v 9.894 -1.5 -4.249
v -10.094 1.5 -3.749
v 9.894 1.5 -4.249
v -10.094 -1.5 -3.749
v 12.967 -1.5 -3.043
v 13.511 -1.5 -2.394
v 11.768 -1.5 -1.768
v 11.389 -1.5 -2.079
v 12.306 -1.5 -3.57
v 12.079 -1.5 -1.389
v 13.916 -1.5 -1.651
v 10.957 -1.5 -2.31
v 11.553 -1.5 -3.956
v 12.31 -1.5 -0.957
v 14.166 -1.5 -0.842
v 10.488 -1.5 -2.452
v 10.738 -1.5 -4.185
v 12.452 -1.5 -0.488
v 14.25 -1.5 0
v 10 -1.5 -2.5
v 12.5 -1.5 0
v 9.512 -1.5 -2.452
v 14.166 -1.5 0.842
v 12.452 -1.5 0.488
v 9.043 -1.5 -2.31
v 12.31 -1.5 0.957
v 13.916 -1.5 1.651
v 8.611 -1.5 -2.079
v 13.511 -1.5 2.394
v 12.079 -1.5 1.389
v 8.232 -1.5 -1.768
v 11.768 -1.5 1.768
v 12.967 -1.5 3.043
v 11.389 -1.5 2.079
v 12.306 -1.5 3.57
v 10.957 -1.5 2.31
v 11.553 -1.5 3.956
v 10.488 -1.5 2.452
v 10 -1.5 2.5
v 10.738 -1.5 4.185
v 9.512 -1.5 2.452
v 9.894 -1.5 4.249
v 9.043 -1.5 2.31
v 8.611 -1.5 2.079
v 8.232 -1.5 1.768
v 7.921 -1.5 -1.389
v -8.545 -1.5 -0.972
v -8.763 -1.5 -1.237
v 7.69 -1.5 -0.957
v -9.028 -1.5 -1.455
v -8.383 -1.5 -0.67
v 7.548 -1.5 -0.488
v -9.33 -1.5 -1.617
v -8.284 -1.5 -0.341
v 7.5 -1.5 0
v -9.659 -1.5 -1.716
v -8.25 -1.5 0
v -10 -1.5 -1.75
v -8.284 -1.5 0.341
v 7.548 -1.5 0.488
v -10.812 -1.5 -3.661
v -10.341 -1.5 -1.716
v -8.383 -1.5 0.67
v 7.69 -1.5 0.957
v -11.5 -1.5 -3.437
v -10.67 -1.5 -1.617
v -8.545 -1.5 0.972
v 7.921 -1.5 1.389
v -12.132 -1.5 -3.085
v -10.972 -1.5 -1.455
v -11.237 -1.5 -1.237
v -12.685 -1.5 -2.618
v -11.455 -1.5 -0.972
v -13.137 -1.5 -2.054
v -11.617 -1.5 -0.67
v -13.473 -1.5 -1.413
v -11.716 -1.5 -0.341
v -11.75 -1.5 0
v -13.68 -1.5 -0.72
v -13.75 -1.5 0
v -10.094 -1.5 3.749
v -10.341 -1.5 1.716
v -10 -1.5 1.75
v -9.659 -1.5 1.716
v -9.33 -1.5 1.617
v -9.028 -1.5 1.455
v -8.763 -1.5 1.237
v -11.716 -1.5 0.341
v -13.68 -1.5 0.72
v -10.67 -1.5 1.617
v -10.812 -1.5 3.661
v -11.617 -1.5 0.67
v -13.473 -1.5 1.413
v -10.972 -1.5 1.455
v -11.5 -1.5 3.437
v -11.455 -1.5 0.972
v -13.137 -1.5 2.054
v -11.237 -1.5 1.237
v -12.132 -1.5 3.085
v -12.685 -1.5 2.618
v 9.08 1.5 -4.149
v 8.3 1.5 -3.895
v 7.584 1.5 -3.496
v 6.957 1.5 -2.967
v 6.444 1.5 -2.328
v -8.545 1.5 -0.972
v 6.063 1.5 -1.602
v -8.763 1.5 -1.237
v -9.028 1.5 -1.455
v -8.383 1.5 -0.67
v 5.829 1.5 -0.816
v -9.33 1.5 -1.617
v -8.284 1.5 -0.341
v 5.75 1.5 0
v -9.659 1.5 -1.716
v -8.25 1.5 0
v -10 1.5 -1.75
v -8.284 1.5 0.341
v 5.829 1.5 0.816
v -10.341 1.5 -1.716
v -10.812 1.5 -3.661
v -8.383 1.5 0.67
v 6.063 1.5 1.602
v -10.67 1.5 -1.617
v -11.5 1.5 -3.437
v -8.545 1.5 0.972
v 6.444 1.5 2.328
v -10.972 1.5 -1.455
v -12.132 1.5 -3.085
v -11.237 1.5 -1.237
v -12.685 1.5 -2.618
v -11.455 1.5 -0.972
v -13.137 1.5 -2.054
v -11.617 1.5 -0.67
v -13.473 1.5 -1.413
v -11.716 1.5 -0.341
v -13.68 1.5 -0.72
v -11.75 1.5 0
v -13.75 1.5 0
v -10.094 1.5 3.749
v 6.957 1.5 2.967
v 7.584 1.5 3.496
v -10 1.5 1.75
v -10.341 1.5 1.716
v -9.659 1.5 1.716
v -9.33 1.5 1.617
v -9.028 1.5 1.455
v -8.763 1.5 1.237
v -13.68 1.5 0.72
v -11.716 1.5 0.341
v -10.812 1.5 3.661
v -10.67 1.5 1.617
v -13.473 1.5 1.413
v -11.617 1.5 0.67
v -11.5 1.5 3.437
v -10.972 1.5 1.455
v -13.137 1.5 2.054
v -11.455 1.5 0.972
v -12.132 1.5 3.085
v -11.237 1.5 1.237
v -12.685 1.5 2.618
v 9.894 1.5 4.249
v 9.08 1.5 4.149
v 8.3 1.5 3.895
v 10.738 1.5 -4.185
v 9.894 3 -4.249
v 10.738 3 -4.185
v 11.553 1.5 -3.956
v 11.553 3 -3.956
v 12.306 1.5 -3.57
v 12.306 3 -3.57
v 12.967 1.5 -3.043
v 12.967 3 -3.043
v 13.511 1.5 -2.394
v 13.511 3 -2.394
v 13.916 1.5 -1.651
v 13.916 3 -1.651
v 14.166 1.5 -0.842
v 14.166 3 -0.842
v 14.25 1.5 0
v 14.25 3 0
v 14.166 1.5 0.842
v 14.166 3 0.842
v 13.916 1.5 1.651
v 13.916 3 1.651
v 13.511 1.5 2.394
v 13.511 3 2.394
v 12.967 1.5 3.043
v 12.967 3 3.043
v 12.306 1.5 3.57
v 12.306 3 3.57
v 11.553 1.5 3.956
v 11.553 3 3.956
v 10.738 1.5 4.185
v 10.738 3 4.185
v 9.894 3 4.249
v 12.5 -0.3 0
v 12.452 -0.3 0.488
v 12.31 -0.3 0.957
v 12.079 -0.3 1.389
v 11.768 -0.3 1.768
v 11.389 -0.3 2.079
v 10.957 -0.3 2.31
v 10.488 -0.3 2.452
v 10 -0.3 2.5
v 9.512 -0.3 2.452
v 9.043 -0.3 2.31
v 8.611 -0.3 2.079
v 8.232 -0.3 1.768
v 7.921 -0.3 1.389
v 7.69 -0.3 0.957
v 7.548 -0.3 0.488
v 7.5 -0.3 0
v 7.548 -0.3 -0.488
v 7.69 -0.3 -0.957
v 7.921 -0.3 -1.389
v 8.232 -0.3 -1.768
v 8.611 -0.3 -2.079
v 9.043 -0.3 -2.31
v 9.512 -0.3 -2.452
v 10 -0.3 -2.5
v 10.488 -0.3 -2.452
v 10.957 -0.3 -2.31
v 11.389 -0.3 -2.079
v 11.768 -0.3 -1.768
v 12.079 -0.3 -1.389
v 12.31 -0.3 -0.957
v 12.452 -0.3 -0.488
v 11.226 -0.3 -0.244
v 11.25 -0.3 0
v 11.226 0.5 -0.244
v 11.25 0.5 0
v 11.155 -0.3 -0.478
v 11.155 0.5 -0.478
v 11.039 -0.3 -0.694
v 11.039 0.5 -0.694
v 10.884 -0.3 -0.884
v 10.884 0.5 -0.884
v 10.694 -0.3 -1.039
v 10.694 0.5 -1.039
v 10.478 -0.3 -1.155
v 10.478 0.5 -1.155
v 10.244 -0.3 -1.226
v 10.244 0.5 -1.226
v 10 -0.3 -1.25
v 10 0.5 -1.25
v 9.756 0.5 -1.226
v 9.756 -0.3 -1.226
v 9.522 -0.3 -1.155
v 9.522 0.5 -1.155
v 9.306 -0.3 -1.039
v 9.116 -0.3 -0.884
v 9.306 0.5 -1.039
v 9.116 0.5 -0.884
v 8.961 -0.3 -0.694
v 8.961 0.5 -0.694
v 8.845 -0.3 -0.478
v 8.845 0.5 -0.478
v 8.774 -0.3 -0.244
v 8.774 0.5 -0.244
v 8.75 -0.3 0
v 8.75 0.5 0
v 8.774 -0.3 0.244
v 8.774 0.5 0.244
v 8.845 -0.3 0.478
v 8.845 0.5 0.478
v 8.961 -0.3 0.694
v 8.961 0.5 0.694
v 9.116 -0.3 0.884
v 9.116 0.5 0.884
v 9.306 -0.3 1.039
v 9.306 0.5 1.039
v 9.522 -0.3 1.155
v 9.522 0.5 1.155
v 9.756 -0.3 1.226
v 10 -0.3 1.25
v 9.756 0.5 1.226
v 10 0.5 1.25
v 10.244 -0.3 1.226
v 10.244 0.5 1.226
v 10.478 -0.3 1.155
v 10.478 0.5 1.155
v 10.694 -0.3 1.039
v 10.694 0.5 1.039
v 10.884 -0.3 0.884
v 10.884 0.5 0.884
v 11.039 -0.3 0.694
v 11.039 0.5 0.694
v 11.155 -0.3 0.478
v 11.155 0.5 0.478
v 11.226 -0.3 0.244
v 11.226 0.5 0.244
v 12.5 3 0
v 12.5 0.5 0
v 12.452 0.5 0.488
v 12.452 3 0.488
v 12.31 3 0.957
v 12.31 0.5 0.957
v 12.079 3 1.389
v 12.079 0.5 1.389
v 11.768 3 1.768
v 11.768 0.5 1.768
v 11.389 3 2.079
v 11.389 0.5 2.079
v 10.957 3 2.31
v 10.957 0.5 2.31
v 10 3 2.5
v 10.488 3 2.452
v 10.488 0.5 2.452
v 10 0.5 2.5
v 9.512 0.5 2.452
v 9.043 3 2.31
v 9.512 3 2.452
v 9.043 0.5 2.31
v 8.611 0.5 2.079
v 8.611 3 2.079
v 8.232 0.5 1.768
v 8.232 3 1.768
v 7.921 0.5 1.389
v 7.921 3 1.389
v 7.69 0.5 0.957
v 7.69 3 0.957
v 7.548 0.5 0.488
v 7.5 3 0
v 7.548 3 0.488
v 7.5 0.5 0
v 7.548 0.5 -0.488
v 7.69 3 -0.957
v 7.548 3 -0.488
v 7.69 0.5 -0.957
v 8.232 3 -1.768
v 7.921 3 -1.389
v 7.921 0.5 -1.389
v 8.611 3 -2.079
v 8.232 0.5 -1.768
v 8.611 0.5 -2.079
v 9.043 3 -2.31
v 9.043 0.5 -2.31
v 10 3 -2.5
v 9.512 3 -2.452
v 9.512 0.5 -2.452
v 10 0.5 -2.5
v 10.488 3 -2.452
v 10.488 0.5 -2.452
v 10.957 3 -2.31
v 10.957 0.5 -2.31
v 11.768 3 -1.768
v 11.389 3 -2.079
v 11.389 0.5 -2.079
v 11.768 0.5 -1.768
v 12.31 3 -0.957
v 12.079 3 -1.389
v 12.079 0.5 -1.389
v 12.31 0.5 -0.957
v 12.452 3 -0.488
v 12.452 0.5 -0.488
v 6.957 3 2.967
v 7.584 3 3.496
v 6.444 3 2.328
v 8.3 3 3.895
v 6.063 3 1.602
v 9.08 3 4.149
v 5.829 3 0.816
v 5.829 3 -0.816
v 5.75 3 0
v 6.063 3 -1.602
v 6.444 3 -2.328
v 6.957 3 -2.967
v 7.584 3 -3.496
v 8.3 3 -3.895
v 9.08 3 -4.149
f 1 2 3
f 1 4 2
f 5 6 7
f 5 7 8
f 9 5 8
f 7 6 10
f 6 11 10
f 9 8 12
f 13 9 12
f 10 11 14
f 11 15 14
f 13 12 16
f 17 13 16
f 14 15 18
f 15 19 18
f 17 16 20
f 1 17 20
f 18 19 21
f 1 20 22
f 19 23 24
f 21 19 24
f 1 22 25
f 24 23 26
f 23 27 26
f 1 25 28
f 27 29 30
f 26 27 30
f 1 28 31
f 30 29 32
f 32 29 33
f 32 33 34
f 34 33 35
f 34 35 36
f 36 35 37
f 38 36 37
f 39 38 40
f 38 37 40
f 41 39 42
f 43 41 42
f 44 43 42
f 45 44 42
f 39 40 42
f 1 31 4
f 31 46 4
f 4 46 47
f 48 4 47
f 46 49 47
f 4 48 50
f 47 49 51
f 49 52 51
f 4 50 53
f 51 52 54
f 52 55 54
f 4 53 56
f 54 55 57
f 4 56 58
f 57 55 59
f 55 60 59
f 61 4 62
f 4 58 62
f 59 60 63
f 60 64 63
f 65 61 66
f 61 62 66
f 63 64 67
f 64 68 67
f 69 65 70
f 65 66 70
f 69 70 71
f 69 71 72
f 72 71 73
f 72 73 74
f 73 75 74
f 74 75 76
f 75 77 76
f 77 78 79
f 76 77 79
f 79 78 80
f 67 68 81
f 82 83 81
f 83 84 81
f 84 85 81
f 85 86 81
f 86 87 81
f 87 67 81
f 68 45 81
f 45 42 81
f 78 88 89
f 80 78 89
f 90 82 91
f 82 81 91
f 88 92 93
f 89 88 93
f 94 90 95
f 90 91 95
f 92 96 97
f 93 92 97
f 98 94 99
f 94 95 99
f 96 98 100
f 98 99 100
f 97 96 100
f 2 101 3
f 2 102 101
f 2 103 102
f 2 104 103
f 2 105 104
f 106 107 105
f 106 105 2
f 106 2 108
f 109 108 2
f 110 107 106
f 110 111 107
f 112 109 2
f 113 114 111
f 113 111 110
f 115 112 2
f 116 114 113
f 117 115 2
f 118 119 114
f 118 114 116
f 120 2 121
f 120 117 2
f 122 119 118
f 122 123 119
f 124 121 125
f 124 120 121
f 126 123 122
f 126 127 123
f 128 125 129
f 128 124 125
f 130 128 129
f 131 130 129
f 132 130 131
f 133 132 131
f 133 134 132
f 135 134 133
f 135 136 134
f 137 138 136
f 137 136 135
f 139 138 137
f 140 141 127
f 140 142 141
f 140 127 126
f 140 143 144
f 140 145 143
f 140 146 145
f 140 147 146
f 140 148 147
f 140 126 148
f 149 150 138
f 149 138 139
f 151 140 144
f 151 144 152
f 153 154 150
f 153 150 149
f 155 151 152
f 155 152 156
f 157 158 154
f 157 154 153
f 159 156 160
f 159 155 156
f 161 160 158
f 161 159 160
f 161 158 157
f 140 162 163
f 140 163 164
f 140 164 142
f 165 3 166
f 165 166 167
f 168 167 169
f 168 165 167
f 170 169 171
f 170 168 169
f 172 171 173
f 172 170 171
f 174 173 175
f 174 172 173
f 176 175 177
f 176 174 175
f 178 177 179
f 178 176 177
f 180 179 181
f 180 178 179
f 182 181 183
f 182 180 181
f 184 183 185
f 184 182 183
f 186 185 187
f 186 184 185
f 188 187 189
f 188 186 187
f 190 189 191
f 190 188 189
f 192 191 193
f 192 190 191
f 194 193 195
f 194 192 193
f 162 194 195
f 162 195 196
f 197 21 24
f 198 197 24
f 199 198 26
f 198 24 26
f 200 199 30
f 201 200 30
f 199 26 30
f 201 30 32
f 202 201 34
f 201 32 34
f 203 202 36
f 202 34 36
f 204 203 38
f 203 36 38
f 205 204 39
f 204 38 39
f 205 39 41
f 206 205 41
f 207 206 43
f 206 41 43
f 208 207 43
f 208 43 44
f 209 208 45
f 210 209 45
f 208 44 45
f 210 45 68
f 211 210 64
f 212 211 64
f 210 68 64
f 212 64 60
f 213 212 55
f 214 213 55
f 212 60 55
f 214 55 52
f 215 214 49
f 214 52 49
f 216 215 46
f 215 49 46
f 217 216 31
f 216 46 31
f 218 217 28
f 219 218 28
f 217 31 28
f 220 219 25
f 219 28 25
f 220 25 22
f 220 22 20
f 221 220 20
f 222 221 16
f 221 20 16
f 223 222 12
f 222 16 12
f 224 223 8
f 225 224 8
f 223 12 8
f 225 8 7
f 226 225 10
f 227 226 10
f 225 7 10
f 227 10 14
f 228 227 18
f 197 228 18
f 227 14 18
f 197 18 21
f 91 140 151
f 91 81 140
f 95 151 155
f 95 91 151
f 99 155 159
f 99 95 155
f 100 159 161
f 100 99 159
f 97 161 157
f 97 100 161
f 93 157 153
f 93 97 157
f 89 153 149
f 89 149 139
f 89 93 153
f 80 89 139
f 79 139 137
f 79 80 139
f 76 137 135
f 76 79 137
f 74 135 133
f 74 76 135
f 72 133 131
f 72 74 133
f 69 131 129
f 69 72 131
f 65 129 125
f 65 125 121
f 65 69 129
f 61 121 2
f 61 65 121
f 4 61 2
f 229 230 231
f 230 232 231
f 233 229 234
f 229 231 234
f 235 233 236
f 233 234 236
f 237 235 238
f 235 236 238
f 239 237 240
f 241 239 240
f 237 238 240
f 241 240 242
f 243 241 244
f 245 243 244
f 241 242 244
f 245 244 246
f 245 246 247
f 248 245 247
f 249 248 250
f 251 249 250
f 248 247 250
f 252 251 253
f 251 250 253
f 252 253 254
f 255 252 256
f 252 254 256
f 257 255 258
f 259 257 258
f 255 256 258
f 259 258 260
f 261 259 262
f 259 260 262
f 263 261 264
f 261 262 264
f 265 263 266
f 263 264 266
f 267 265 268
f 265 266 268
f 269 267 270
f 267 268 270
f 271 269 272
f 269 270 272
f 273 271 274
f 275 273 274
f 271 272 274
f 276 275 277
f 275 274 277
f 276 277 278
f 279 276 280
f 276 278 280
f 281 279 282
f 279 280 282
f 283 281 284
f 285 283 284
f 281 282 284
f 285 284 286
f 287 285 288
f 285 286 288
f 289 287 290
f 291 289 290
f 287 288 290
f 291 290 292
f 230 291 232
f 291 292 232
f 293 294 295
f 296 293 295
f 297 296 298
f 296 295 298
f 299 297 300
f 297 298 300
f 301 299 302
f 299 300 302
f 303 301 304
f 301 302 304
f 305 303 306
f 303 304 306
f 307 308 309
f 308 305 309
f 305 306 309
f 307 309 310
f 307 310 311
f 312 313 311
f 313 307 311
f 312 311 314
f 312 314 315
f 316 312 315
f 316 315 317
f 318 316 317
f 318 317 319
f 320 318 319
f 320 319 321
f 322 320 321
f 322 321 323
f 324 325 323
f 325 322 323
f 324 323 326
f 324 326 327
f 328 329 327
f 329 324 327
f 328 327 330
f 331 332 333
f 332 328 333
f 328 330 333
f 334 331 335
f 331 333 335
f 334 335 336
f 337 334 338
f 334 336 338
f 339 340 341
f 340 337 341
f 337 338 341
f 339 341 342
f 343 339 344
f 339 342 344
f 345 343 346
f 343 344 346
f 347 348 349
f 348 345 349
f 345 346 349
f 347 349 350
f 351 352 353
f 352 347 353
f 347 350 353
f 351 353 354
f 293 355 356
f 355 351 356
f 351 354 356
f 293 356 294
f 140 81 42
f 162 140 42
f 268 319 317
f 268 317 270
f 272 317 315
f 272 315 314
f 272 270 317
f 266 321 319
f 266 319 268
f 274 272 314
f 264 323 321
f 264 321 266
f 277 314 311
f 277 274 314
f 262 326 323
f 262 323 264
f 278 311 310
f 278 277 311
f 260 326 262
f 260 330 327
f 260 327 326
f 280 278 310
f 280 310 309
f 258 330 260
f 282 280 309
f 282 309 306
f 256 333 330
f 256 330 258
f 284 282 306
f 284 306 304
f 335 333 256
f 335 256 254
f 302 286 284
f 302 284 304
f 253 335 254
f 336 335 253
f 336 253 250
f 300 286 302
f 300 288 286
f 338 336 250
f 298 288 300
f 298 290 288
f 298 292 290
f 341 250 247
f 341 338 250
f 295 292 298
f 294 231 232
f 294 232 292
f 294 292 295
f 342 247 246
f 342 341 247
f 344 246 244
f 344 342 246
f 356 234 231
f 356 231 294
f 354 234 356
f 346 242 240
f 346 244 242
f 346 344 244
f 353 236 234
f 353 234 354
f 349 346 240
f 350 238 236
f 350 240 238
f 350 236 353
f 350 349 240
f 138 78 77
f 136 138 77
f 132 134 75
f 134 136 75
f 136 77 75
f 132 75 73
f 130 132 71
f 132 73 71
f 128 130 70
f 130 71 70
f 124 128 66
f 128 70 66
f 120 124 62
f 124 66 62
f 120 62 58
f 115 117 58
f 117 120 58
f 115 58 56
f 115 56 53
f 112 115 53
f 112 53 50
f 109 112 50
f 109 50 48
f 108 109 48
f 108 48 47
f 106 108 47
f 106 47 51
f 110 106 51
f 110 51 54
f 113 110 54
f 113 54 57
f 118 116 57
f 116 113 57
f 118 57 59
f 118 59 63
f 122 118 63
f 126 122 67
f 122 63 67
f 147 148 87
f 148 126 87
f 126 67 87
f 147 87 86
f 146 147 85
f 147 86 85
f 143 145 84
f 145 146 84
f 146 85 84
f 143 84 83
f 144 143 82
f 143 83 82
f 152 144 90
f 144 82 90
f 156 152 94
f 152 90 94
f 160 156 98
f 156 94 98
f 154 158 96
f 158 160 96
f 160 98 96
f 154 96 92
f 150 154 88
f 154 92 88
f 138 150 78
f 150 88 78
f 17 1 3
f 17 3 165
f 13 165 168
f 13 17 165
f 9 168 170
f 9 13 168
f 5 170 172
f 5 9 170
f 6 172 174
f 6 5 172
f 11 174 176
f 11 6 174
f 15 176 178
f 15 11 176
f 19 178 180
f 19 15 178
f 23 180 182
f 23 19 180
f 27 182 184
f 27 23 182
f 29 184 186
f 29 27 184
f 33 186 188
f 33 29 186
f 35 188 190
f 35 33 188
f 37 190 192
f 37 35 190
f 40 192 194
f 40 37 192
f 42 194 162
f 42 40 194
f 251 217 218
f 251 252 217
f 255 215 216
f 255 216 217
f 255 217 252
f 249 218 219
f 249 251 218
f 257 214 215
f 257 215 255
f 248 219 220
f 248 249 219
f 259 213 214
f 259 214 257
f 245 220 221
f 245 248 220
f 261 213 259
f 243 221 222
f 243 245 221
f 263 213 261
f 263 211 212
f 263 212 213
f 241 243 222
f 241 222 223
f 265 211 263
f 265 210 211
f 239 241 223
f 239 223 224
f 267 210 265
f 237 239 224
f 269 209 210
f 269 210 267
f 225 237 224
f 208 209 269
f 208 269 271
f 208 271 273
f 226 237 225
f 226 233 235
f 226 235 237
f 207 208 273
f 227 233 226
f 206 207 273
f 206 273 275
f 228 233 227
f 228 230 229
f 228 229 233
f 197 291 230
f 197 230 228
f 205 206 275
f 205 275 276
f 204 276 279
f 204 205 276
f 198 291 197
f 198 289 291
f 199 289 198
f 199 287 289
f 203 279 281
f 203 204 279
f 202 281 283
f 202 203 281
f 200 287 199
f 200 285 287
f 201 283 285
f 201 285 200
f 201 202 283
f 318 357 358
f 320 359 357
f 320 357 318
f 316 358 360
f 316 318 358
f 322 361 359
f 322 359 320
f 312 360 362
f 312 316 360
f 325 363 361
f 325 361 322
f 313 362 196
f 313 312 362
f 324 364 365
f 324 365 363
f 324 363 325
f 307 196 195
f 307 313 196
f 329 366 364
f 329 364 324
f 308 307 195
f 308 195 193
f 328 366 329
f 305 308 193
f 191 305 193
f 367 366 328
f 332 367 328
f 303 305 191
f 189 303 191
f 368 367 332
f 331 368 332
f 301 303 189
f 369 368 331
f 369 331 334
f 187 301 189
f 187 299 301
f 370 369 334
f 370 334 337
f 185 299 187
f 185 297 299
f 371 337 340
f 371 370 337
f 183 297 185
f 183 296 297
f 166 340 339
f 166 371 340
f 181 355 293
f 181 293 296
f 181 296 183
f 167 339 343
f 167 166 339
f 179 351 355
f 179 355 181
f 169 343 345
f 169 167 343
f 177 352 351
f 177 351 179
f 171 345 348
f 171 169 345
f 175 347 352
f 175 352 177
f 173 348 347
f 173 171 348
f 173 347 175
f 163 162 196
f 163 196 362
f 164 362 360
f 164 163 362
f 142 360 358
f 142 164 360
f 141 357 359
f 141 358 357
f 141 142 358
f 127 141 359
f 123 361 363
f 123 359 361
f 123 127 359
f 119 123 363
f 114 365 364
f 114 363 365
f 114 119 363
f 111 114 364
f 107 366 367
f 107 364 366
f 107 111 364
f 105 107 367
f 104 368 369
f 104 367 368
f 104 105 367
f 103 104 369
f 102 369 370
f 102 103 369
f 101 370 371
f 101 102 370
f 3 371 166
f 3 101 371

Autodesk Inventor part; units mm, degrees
ref_plane "YZ Plane" through (0, 0, 0) normal (1, 0, 0) x (0, 1, 0)
ref_plane "XZ Plane" through (0, 0, 0) normal (0, 1, 0) x (-1, 0, 0)
ref_plane "XY Plane" through (0, 0, 0) normal (0, 0, 1) x (1, 0, 0)
sketch "Sketch1" plane through (0, 0, 0) normal (0, 1, 0) x (-1, 0, 0)
  line L0 (0, 0) -> (10, 0) construction
  circle A0 centre (10, 0) radius 3.75
  circle A1 centre (10, 0) radius 1.75
  line L1 (0, 0) -> (-10, 0) construction
  circle A2 centre (-10, 0) radius 4.25
  line L2 (10.0938, 3.7488) -> (-9.8938, 4.2487)
  line L3 (10.0938, -3.7488) -> (-9.8938, -4.2487)
  dimension "d1" = 7.5
  dimension "d0" = 10
  dimension "d2" = 3.5
  dimension "d3" = 10
extrude "Extrusion1" add sketch "Sketch1" along normal mid plane 3
sketch "Sketch2" plane through (0, 1.5, 0) normal (0, 1, 0) x (1, 0, 0)
  arc A0 (9.8938, -4.2487) -> (9.8938, 4.2487) centre (10, 0) ccw projected
  circle A1 centre (10, 0) radius 2.5
  circle A2 centre (10, 0) radius 4.25
  point P0 (0, 0)
  point P1 (9.8937, 4.2487)
  point P2 (9.8938, -4.2487)
  dimension "d9" = 5
extrude "Extrusion2" add sketch "Sketch2" along normal blind 1.5
sketch "Sketch4" plane through (10, 1.5, 0) normal (0, 1, 0) x (1, 0, 0)
  circle A0 centre (0, 0) radius 2.5 projected
  circle A1 centre (0, 0) radius 2.5
  point P0 (-10, 0)
  dimension "d13" = 5
extrude "Extrusion3" cut sketch "Sketch4" against normal blind 1
sketch "Sketch5" plane through (10, 0.5, 0) normal (0, 1, 0) x (1, 0, 0)
  circle A0 centre (0, 0) radius 2.5 projected
  circle A1 centre (0, 0) radius 1.25
  point P0 (-10, 0)
  dimension "d16" = 2.5
extrude "Extrusion4" cut sketch "Sketch5" against normal blind 0.8 contours A1
sketch "Sketch6" plane through (0, -1.5, 0) normal (0, -1, 0) x (1, 0, 0)
  arc A0 (9.8938, -4.2487) -> (9.8938, 4.2487) centre (10, 0) ccw projected
  circle A1 centre (10, 0) radius 2.5
  point P0 (0, 0)
  dimension "d19" = 5
extrude "Extrusion5" cut sketch "Sketch6" against normal blind 1.2
properties part number "eje de servo 1"
